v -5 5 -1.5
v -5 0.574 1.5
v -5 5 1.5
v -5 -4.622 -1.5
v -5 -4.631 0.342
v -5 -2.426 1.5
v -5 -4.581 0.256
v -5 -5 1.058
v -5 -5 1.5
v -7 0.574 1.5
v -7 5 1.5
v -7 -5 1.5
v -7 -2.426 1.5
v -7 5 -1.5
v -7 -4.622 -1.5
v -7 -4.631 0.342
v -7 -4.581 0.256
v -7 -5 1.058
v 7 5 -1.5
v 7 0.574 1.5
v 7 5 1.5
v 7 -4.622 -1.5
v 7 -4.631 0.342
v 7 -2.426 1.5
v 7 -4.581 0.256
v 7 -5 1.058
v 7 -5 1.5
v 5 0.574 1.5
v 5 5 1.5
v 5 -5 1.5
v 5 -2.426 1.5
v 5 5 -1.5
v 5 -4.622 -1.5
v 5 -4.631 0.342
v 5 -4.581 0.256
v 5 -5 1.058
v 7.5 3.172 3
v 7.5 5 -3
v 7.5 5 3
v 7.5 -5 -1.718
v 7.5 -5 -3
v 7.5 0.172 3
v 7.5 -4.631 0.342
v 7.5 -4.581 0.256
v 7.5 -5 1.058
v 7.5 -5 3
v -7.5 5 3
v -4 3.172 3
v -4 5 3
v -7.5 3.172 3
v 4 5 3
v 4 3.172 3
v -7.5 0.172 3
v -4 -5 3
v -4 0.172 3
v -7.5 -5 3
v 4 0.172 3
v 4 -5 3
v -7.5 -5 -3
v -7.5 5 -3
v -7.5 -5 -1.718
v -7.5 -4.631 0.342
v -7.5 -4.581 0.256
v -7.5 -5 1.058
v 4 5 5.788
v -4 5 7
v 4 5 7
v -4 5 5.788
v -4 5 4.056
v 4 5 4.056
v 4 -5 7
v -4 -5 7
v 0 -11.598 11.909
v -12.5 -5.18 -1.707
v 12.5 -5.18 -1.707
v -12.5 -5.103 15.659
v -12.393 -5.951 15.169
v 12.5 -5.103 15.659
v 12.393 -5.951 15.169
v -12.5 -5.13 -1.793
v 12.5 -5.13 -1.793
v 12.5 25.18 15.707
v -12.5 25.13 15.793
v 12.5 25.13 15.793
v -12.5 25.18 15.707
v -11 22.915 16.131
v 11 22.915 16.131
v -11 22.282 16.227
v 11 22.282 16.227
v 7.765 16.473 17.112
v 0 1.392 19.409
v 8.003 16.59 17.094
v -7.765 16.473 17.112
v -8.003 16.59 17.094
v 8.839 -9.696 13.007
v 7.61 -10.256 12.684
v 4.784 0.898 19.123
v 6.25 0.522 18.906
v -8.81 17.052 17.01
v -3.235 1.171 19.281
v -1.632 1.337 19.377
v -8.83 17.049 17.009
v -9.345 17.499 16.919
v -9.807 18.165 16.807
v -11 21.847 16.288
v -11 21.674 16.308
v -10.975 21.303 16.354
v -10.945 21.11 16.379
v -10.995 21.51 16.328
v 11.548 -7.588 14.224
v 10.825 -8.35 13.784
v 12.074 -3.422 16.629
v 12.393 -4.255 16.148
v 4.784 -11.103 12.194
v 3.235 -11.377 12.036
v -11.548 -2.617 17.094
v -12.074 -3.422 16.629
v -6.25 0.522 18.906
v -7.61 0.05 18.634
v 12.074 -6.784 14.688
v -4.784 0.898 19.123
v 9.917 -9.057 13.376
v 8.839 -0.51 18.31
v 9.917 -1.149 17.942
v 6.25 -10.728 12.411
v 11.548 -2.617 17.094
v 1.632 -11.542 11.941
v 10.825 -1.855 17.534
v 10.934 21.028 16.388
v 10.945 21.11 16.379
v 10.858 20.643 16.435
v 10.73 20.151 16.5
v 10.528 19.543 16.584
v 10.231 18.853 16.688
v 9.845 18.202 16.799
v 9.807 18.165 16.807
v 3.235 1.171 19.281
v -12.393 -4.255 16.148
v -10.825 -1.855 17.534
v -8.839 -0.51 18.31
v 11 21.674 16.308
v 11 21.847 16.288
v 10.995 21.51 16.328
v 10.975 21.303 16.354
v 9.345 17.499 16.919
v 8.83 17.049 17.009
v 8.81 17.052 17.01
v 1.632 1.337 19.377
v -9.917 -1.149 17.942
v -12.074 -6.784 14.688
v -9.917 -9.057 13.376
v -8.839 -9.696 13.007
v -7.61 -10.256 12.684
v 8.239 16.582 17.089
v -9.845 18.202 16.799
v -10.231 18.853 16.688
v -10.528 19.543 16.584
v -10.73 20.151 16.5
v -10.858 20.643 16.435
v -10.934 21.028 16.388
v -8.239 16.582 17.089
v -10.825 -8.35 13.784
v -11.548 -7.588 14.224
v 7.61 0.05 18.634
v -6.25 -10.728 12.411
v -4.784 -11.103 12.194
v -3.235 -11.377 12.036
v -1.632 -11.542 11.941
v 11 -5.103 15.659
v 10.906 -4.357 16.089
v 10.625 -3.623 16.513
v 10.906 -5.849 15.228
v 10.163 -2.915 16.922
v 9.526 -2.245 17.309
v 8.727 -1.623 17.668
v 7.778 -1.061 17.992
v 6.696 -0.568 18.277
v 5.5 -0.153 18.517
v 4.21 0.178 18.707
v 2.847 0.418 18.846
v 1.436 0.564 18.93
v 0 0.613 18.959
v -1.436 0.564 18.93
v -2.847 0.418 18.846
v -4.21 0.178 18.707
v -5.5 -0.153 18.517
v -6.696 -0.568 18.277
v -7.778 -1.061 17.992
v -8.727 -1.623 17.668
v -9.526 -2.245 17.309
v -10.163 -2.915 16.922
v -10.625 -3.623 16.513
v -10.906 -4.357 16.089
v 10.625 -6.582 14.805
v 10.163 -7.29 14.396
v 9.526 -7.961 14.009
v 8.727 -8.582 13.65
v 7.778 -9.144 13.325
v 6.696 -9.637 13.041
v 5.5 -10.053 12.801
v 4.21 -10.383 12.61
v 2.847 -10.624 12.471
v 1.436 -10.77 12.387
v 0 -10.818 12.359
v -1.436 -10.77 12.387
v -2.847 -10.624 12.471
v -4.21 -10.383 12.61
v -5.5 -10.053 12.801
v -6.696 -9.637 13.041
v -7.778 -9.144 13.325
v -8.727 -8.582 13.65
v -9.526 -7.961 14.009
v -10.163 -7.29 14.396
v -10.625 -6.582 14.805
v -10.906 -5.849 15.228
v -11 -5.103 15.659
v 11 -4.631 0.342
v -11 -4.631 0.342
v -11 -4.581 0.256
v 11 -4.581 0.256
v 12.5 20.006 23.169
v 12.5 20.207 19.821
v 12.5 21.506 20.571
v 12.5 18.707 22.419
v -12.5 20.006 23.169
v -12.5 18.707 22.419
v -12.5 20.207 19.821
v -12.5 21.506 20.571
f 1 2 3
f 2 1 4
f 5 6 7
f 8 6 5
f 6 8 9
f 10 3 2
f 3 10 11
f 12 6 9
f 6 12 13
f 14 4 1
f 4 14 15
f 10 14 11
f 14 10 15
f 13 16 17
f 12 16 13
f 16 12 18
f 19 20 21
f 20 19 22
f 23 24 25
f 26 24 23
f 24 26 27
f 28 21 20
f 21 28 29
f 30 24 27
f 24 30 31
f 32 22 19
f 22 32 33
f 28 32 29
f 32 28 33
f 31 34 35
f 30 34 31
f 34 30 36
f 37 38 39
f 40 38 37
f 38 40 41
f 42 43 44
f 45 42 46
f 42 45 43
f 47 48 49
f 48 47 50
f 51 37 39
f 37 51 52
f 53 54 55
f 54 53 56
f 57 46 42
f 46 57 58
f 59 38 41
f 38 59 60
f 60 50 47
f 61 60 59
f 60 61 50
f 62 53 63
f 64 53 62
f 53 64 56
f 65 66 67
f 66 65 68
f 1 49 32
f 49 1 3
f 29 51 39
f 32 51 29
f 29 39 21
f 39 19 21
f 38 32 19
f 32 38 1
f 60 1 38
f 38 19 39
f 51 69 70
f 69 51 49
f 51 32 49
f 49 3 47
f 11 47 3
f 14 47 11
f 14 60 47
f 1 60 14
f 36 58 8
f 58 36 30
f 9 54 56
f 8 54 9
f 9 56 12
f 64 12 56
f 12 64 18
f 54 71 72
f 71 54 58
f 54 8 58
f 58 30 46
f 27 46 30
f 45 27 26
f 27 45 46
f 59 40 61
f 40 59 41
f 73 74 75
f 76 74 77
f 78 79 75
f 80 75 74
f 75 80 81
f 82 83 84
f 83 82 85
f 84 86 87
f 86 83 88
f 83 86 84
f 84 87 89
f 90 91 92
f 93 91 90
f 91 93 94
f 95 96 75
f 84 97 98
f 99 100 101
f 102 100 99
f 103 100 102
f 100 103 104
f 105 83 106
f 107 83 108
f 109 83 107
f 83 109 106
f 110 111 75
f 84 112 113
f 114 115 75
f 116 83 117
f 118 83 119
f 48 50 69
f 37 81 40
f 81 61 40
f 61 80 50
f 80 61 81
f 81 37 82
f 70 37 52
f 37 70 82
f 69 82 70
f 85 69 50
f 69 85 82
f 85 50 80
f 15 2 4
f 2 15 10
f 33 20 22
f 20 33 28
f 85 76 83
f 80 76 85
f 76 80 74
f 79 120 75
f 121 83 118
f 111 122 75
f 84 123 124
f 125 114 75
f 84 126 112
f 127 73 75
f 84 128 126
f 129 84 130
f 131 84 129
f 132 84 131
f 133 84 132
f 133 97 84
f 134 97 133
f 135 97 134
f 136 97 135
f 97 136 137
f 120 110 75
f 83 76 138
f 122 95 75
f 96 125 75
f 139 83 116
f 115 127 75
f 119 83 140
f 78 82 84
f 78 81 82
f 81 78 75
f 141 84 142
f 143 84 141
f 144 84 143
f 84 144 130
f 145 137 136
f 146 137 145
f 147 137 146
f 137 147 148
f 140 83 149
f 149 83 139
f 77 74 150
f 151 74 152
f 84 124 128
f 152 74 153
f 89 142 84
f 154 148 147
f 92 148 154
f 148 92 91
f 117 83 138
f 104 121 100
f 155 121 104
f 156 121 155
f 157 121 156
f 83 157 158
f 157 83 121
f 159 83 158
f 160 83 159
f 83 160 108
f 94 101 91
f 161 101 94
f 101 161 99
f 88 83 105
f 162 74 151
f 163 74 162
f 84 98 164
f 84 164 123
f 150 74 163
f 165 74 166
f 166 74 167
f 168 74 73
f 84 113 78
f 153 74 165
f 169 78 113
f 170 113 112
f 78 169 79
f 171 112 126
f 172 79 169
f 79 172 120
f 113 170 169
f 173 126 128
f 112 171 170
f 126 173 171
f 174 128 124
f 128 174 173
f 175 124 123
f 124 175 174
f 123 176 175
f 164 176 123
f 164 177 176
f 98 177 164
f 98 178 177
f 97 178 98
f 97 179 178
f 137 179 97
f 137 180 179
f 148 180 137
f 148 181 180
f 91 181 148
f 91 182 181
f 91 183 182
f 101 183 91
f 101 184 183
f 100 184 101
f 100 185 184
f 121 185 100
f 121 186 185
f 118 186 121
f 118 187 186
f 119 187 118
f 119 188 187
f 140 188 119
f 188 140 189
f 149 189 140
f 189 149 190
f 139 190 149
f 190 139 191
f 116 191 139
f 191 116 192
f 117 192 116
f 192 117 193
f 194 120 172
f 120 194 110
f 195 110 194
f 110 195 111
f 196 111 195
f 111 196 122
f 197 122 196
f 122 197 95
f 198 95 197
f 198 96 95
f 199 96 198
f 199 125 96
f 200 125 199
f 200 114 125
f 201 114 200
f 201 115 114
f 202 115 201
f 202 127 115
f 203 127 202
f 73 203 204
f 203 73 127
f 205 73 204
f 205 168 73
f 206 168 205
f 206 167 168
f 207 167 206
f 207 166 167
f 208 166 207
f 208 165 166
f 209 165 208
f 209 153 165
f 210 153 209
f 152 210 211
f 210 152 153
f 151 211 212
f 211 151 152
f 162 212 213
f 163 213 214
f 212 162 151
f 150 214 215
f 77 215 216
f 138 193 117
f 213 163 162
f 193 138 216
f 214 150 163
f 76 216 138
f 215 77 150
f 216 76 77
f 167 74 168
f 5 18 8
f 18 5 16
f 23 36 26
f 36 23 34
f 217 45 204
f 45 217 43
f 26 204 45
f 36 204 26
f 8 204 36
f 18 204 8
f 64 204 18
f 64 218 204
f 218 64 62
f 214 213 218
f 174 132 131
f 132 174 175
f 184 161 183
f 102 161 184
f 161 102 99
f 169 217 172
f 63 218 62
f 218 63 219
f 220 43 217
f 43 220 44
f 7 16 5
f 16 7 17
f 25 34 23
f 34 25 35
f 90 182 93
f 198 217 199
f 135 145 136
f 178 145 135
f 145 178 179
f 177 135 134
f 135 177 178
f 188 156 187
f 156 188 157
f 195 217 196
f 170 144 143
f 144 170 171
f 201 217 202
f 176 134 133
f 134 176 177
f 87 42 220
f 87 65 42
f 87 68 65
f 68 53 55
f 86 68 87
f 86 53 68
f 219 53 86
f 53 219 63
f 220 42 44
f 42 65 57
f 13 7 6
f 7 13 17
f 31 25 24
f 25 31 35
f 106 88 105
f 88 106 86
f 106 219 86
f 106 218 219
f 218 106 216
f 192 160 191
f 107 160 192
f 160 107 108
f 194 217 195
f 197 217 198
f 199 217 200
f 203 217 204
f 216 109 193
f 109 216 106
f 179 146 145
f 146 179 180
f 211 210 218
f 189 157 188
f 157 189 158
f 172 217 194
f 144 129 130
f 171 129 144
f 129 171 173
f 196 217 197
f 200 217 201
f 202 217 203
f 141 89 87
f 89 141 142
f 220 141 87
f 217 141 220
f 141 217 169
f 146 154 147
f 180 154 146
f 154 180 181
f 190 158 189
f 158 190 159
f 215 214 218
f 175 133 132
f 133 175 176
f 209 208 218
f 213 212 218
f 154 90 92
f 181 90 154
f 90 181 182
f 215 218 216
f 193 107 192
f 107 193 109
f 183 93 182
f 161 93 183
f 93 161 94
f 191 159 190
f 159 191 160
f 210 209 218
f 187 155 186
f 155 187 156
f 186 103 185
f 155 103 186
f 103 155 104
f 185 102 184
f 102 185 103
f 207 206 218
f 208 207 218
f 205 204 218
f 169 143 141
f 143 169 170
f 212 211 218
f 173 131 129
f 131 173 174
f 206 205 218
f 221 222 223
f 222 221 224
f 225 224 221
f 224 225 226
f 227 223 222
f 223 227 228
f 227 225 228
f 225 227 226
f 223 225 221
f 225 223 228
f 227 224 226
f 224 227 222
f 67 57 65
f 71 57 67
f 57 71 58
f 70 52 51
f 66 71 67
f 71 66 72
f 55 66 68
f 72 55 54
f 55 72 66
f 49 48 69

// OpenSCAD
// AstraAnt Tool: Regolith Scoop
// Print in PETG. No electronics — fully passive.
// Mandibles grip the handle, scoop digs into regolith.
//
// Print orientation: scoop-side up
// Supports: none needed

$fn = 48;


// Universal magnetic mount interface
// Clips between ant mandibles, held by neodymium magnets
module magnetic_mount(width=15, depth=10, magnet_d=4) {
    difference() {
        // Mount body
        cube([width, depth, 6], center=true);
        // Magnet pocket (recessed)
        translate([0, 0, 1.5])
            cylinder(d=4+0.2, h=3, center=true, $fn=32);
        // Mandible grip grooves (two channels for ant mandibles)
        for (side = [-1, 1]) {
            translate([side * (width/2 - 1.5), 0, 0])
                cube([2, depth+1, 3], center=true);
        }
    }
}


// Parameters
scoop_width = 25;
scoop_depth = 15;
scoop_length = 35;
wall_thickness = 1.5;
lip_height = 3;       // Rear lip prevents material sliding out

module scoop() {
    difference() {
        // Outer shell
        hull() {
            translate([0, 0, 0])
                cube([scoop_width, scoop_length, 0.1], center=true);
            translate([0, -scoop_length/4, scoop_depth])
                scale([1, 0.6, 1])
                    cylinder(d=scoop_width, h=0.1, center=true);
        }
        // Inner cavity
        translate([0, 0, wall_thickness])
            hull() {
                translate([0, 0, 0])
                    cube([scoop_width - 2*wall_thickness,
                          scoop_length - 2*wall_thickness, 0.1], center=true);
                translate([0, -scoop_length/4, scoop_depth - wall_thickness])
                    scale([1, 0.6, 1])
                        cylinder(d=scoop_width - 2*wall_thickness, h=0.1, center=true);
            }
    }
    // Rear lip
    translate([0, scoop_length/2 - wall_thickness, scoop_depth/2])
        cube([scoop_width, wall_thickness, lip_height], center=true);
}

module scoop_head_assembly() {
    // Mount
    magnetic_mount();
    // Handle connecting mount to scoop
    translate([0, 0, 3])
        cube([8, 10, 8], center=true);
    // Scoop
    translate([0, 10, 7])
        rotate([30, 0, 0])
            scoop();
}

scoop_head_assembly();
